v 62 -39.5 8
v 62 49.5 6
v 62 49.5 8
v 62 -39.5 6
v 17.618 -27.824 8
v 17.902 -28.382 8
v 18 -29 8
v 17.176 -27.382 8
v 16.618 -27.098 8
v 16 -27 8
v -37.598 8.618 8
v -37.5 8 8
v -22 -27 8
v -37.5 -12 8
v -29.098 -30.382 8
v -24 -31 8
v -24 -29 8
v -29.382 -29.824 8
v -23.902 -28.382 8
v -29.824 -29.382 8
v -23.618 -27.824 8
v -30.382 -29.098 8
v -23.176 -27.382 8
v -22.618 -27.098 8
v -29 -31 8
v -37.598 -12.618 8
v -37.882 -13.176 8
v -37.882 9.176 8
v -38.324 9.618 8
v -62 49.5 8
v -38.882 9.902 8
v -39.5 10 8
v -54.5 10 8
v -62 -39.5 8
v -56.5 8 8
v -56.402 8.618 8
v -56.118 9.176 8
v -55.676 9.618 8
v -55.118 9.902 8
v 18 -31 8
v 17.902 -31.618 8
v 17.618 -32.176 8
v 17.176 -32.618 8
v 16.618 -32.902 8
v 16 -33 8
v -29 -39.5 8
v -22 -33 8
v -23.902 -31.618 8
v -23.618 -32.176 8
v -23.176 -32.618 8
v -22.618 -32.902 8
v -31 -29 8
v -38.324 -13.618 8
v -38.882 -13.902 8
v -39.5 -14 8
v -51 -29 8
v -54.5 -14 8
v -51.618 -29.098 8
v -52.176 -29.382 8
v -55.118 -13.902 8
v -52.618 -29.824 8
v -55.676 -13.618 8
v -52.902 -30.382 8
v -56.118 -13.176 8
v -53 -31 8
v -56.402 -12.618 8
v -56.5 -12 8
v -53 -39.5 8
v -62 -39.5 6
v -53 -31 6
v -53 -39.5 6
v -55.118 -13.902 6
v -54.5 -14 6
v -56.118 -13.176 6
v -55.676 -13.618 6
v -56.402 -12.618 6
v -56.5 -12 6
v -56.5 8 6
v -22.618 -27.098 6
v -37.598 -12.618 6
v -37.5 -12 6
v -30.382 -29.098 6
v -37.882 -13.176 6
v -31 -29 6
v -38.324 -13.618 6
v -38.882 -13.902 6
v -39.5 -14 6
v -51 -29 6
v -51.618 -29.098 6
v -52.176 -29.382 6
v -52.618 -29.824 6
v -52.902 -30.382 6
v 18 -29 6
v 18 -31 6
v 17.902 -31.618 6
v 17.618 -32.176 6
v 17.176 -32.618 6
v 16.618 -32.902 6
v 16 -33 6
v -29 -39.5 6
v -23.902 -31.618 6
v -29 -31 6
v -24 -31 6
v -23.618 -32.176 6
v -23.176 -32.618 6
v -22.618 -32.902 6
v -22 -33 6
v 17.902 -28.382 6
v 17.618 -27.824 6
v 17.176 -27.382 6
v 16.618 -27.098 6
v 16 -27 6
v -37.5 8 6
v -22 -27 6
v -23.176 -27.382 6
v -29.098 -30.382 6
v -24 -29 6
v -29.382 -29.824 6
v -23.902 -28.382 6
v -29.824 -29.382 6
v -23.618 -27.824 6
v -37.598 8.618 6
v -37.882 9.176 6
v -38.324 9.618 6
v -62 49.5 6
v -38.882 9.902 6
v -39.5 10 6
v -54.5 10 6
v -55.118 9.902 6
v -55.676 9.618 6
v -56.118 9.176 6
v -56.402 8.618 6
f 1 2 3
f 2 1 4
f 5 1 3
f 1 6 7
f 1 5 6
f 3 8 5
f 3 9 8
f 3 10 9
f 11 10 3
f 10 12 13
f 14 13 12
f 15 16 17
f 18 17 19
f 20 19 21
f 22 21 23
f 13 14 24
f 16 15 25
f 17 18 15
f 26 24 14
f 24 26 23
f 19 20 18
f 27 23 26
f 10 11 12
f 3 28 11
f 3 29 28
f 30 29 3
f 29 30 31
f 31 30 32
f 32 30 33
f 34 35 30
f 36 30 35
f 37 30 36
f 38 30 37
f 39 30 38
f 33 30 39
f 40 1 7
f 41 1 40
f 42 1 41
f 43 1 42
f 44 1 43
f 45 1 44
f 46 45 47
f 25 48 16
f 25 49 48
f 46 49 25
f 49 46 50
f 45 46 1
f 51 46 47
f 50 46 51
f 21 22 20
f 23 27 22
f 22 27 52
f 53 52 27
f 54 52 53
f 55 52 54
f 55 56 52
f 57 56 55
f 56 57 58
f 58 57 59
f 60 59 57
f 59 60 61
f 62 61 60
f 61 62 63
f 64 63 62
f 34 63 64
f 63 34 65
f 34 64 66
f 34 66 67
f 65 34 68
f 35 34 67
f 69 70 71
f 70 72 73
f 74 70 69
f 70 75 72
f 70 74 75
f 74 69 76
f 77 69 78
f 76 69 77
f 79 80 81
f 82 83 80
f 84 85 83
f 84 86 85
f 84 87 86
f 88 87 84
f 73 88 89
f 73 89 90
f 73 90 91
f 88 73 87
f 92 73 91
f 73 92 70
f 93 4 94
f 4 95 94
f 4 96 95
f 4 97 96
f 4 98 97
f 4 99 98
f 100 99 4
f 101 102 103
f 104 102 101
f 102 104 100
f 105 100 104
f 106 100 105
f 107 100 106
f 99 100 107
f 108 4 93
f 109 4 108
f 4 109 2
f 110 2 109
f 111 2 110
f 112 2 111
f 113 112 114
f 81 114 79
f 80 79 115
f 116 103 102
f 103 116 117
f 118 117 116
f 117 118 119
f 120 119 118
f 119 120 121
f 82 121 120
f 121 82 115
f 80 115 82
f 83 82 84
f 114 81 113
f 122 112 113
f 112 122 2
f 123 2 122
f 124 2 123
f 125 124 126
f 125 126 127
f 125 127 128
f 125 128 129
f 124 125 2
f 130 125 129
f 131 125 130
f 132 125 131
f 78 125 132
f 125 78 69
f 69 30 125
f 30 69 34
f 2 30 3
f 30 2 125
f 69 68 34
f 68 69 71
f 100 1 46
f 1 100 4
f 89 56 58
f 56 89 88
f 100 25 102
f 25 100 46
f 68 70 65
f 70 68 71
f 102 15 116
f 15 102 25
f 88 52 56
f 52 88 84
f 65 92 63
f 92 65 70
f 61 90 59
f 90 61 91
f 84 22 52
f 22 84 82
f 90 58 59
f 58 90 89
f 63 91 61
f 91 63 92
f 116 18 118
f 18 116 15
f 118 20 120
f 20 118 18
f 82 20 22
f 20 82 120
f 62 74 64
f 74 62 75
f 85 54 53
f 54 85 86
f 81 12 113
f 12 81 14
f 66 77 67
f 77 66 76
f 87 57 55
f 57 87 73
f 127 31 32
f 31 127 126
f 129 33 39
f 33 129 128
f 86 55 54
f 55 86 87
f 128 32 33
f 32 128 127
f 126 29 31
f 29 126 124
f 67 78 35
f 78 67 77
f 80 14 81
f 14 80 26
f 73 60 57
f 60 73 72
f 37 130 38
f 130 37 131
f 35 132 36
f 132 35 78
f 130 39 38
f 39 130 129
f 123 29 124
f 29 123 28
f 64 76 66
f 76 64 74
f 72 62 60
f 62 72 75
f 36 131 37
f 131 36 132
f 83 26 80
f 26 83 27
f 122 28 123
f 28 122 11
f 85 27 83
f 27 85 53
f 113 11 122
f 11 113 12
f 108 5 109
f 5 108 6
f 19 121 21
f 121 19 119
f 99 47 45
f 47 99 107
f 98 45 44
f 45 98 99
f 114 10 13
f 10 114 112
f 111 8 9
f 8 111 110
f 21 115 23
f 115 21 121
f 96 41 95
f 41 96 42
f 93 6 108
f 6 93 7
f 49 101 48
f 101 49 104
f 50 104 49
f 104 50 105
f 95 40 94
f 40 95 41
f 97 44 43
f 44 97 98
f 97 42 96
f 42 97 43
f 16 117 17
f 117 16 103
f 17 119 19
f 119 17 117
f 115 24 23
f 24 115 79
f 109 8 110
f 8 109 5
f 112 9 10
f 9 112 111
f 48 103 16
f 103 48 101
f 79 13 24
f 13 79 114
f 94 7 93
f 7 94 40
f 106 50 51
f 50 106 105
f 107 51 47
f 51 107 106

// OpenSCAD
$fn=20;
//iphone4 case
icase();

// can't be larger than 152.4mm
icaseX = 133;
icaseY = 90;
icaseZ = 20;
icaseShiftX = 0;
icaseShiftY = 6;
icaseShiftZ = 0;

// the Z is heighter on purpose.
// Play with ShiftZ, not Z.
iphoneX = 120;
iphoneY = 64;
iphoneZ = 50;
iphoneShiftX = 0;
iphoneShiftY = 14;
iphoneShiftZ = 17;

// the plate track cut.
plateX = 125;
plateY = 200;
plateZ = 2;
plateShiftX = 0;
plateShiftY = -50;
plateShiftZ = 7;
platetopShiftX = 0;
platetopShiftY = -50;
platetopShiftZ = 33;

// the Screen Hole.
// The X and Y are actually backwards.
screenX = 80;
screenY = 55;
screenZ = 152;
screenShiftX = 0;
screenShiftY = 14;
screenShiftZ = -5;

// the front camera Hole.
// The X and Y are actually backwards.
fcX = 20;
fcY = 25;
fcZ = 152;
fcShiftX = -45;
fcShiftY = 14;
fcShiftZ = -5;

// the front button Hole.
// The X and Y are actually backwards.
fbX = 20;
fbY = 25;
fbZ = 152;
fbShiftX = 45;
fbShiftY = 14;
fbShiftZ = -5;

// Power button
// The X and Y are actually backwards.
pbX = 30;
pbY = 15;
pbZ = 6;
pbShiftX = -65;
pbShiftY = -4;
pbShiftZ = 0;

// Headphone Jack
// The X and Y are actually backwards.
hjX = 30;
hjY = 15;
hjZ = 6;
hjShiftX = -65;
hjShiftY = 34;
hjShiftZ = 0;

// Speaker Hole with usb Iphone cable
// The X and Y are actually backwards.
sX = 30;
sY = 48;
sZ = 6;
sShiftX = 65;
sShiftY = 14;
sShiftZ = 0;

// Volume Controls
// The X and Y are actually backwards.
vX = 35;
vY = 30;
vZ = 6;
vShiftX = -35;
vShiftY = 50;
vShiftZ = 0;

//////////////////////////////////////////////////
//// Rail System Variables Passed this Point. ////
//////////////////////////////////////////////////

gRailx = 0;
gRaily = 13;
gRailz = 0;

// This is a spring hole for the rail button.
bspringX = 35;
bspringY = 10;
bspringZ = 15;
bspringXShift = 40;
bspringYShift = -44;
bspringZShift = 2;

// Rail first pass.
railx = 17;
raily = 10;
railz = 60;
railxShift = -41;
railyShift = -49;
railzShift = 0;

// Rail second pass, one triangle.
ltp = 5;
lth = 40;
ltxShift = -29;
ltyShift = -48;
ltzShift = 0;

// Rail third pass, second triangle.
rtp = 5;
rth = 40;
rtxShift = -53;
rtyShift = -48;
rtzShift = 0;

// path for rail button
prbx = 100;
prby = 10;
prbz = 15;
prbxShift = -5;
prbyShift = -44;
prbzShift = 10;

// Negative space for your finger to push the button.
nbsx = 40;
nbsy = 20;
nbsz = 60;
nbsxShift = -3;
nbsyShift = -50;
nbszShift = 0;

module icase()
{
// This is where you Copy and Paste if you need to see invisible space.


	difference()
	{
		//Cutting the Plate grove.
		translate([plateShiftX,5,plateShiftZ])
		cube([(plateX-1),(icaseY-1),plateZ], center = true);

		// cutting the rail hole.
		translate([-41,-41,0])
		minkowski() {
    cube([20,20,100], center = true);
    cylinder(r=2,h=2);
		}

		// cutting the camera hole.
		translate([-47,-2,0])
		minkowski() {
    cube([15,20,100], center = true);
    cylinder(r=2,h=2);
		}

		// Plates Screw grove.
		translate([-3, -30, nbszShift])
		minkowski() {
		cube([38,2,100], center = true);
		cylinder(r=2,h=2);
		}
	}
}
